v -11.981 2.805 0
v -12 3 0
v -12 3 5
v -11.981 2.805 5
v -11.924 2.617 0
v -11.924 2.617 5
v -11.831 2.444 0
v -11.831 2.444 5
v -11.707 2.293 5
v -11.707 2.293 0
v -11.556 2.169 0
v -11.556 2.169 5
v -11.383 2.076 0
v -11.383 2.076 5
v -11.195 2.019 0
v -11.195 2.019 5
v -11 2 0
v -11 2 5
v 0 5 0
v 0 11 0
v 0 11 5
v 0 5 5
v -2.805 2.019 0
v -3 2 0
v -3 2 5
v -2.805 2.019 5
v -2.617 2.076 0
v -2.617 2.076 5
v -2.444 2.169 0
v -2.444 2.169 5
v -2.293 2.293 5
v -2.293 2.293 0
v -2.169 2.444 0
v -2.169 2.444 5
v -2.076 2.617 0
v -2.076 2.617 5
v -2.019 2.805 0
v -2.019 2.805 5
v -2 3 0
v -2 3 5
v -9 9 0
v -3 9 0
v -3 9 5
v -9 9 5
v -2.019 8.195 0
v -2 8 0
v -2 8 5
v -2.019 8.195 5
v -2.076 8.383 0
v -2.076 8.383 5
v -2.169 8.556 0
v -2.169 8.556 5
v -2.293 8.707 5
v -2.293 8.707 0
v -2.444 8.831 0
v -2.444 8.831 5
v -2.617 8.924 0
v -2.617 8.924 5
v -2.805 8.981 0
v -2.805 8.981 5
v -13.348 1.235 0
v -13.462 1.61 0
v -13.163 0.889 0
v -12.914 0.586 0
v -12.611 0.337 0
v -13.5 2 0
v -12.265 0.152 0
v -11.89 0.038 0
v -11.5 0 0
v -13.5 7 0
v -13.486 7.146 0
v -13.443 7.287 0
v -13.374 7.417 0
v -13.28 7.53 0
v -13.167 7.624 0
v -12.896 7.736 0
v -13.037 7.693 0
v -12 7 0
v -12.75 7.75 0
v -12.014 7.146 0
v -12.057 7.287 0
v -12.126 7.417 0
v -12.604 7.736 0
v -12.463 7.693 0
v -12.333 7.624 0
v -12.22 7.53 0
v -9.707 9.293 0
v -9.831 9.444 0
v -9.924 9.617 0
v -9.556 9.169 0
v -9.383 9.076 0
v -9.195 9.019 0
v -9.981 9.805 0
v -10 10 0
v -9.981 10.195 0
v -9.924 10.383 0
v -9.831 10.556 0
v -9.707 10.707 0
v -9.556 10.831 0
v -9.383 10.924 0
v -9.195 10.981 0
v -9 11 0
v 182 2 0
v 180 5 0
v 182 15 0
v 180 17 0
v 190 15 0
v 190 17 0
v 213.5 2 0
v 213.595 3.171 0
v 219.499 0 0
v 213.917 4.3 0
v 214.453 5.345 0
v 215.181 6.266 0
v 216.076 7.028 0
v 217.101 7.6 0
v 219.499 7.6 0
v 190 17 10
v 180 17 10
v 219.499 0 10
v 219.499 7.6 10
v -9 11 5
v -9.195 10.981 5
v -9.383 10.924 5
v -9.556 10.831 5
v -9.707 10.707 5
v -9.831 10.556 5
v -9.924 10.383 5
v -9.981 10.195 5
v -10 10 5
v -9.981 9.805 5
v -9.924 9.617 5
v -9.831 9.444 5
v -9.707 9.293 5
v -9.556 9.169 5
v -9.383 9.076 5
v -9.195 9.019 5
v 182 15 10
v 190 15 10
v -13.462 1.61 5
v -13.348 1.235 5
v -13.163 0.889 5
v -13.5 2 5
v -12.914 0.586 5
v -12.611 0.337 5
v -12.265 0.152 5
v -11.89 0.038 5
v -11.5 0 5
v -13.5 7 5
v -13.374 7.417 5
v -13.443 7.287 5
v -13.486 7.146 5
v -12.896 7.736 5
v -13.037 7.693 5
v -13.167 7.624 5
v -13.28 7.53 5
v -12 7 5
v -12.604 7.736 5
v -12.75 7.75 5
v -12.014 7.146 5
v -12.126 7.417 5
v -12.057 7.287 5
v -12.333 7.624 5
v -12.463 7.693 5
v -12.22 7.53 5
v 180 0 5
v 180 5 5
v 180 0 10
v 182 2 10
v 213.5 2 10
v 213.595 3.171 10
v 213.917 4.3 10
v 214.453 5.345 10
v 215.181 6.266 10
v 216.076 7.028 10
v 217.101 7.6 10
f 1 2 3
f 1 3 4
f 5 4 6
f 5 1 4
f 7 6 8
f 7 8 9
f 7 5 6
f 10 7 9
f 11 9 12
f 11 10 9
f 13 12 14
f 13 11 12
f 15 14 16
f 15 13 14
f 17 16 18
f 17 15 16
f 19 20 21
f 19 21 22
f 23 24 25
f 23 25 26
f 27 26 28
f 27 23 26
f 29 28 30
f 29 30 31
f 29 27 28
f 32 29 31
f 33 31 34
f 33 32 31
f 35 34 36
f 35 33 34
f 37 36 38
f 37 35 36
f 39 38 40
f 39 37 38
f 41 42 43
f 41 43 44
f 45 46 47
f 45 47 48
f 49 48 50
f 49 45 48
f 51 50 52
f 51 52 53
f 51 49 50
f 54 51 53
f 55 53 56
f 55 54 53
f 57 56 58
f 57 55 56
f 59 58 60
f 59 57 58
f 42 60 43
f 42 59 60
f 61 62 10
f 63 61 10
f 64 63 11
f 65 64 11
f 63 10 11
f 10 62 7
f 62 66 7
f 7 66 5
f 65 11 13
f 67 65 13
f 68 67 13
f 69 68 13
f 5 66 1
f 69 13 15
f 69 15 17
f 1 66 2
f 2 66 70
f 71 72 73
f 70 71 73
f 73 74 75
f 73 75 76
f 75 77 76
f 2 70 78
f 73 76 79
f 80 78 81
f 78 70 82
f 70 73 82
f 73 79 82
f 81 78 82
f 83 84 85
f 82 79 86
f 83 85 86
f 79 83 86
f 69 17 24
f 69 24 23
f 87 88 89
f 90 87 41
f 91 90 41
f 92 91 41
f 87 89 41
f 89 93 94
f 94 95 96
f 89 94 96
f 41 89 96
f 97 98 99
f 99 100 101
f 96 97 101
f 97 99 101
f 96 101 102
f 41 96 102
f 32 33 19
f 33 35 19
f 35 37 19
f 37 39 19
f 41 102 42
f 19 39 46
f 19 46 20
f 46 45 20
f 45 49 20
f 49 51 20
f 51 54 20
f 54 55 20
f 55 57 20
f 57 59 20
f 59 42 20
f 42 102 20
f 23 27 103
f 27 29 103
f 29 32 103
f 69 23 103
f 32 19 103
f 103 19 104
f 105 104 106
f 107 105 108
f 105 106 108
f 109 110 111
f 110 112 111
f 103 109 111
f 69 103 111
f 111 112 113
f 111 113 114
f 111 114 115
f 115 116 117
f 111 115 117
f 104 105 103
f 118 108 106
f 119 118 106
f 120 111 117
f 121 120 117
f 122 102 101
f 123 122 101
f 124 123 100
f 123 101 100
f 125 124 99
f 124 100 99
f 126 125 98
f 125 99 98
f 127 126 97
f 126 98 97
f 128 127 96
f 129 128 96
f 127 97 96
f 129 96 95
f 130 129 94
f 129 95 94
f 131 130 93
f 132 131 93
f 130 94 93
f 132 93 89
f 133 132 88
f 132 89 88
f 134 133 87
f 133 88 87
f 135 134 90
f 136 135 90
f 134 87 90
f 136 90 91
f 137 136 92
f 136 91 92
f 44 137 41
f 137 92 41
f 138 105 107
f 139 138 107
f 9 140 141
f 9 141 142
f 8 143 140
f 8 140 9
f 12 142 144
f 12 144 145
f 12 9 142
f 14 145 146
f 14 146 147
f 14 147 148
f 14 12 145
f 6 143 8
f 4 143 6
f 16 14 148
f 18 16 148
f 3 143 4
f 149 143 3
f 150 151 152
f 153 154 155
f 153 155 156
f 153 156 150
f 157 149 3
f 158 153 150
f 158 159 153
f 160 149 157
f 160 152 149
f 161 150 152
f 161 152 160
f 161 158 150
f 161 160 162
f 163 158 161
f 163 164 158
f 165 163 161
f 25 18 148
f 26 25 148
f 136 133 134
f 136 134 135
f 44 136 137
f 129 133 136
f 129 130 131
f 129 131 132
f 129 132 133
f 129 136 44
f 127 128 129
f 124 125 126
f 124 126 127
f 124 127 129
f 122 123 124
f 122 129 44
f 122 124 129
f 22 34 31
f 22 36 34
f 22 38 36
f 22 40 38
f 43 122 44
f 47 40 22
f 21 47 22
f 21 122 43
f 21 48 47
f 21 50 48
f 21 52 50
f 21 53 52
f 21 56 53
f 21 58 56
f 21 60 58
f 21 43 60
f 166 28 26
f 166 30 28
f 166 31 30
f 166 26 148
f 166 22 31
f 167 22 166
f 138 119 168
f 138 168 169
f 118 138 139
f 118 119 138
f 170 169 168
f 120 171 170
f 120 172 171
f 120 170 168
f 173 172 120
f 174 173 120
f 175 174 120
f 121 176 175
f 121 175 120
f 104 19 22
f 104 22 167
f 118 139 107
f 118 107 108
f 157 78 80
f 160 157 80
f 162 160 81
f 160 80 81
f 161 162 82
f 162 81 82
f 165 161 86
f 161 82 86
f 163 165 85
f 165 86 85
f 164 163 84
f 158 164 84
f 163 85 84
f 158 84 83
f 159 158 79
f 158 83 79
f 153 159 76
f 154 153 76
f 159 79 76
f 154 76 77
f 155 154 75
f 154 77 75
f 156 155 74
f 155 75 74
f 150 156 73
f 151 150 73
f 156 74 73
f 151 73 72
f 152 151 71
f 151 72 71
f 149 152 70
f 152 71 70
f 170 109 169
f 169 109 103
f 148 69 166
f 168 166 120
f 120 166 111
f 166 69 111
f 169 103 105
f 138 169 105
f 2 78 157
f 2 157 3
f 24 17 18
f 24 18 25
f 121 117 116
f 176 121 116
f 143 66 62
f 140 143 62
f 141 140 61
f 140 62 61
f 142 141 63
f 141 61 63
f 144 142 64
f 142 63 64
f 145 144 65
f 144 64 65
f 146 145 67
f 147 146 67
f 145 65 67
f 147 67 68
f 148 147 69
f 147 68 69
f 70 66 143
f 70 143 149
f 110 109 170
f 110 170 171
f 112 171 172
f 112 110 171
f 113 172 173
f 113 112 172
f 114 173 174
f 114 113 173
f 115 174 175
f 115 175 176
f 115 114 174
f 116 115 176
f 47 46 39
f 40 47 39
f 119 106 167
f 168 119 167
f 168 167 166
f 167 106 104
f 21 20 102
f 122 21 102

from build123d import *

# Parameters (mm, degrees)
PAD_DEPTH    = 5
SKETCH002_W  = 180
SKETCH002_H  = 5
PAD002_DEPTH = 5
PAD003_DEPTH = 10


with BuildPart() as part:
    # Sketch → Pad (new body)
    with BuildSketch(Plane.XY):
        with BuildLine():
            Line((0, 0), (-11.5, 0))
            ThreePointArc((-13.5, 2), (-12.914214, 0.585786), (-11.5, 0))
            Line((-13.5, 2), (-13.5, 7))
            ThreePointArc((-12, 7), (-12.75, 7.75), (-13.5, 7))
            Line((-12, 7), (-12, 3))
            ThreePointArc((-12, 3), (-11.707107, 2.292893), (-11, 2))
            Line((-11, 2), (-3, 2))
            ThreePointArc((-3, 2), (-2.292893, 2.292893), (-2, 3))
            Line((-2, 8), (-2, 3))
            ThreePointArc((-2, 8), (-2.292893, 8.707107), (-3, 9))
            Line((-3, 9), (-9, 9))
            ThreePointArc((-9, 11), (-10, 10), (-9, 9))
            Line((0, 11), (-9, 11))
            Line((0, 11), (0, 0))
        make_face()
    extrude(amount=PAD_DEPTH)

    # Sketch002 → Pad002 (join)
    with BuildSketch(Plane.XY):
        with Locations((90, 2.5)):
            Rectangle(SKETCH002_W, SKETCH002_H)
    extrude(amount=PAD002_DEPTH)

    # Sketch001 → Pad003 (join)
    with BuildSketch(Plane(origin=(180, 0, 0), x_dir=(-1, 0, 0), z_dir=(0, 0, -1))):
        with BuildLine():
            Line((0, 0), (-39.499167, 0))
            Line((-39.499167, 0), (-39.499167, 2.1))
            Line((-39.499167, 2.1), (-39.499167, 7.6))
            Line((-39.499167, 7.6), (-37.101251, 7.6))
            ThreePointArc((-33.5, 2), (-34.452609, 5.345343), (-37.101251, 7.6))
            Line((-33.5, 2), (-2, 2))
            Line((-2, 2), (-2, 15))
            Line((-2, 15), (-10, 15))
            Line((-10, 15), (-10, 17))
            Line((-10, 17), (0, 17))
            Line((0, 17), (0, 0))
        make_face()
    extrude(amount=-PAD003_DEPTH)


solid = part.part
